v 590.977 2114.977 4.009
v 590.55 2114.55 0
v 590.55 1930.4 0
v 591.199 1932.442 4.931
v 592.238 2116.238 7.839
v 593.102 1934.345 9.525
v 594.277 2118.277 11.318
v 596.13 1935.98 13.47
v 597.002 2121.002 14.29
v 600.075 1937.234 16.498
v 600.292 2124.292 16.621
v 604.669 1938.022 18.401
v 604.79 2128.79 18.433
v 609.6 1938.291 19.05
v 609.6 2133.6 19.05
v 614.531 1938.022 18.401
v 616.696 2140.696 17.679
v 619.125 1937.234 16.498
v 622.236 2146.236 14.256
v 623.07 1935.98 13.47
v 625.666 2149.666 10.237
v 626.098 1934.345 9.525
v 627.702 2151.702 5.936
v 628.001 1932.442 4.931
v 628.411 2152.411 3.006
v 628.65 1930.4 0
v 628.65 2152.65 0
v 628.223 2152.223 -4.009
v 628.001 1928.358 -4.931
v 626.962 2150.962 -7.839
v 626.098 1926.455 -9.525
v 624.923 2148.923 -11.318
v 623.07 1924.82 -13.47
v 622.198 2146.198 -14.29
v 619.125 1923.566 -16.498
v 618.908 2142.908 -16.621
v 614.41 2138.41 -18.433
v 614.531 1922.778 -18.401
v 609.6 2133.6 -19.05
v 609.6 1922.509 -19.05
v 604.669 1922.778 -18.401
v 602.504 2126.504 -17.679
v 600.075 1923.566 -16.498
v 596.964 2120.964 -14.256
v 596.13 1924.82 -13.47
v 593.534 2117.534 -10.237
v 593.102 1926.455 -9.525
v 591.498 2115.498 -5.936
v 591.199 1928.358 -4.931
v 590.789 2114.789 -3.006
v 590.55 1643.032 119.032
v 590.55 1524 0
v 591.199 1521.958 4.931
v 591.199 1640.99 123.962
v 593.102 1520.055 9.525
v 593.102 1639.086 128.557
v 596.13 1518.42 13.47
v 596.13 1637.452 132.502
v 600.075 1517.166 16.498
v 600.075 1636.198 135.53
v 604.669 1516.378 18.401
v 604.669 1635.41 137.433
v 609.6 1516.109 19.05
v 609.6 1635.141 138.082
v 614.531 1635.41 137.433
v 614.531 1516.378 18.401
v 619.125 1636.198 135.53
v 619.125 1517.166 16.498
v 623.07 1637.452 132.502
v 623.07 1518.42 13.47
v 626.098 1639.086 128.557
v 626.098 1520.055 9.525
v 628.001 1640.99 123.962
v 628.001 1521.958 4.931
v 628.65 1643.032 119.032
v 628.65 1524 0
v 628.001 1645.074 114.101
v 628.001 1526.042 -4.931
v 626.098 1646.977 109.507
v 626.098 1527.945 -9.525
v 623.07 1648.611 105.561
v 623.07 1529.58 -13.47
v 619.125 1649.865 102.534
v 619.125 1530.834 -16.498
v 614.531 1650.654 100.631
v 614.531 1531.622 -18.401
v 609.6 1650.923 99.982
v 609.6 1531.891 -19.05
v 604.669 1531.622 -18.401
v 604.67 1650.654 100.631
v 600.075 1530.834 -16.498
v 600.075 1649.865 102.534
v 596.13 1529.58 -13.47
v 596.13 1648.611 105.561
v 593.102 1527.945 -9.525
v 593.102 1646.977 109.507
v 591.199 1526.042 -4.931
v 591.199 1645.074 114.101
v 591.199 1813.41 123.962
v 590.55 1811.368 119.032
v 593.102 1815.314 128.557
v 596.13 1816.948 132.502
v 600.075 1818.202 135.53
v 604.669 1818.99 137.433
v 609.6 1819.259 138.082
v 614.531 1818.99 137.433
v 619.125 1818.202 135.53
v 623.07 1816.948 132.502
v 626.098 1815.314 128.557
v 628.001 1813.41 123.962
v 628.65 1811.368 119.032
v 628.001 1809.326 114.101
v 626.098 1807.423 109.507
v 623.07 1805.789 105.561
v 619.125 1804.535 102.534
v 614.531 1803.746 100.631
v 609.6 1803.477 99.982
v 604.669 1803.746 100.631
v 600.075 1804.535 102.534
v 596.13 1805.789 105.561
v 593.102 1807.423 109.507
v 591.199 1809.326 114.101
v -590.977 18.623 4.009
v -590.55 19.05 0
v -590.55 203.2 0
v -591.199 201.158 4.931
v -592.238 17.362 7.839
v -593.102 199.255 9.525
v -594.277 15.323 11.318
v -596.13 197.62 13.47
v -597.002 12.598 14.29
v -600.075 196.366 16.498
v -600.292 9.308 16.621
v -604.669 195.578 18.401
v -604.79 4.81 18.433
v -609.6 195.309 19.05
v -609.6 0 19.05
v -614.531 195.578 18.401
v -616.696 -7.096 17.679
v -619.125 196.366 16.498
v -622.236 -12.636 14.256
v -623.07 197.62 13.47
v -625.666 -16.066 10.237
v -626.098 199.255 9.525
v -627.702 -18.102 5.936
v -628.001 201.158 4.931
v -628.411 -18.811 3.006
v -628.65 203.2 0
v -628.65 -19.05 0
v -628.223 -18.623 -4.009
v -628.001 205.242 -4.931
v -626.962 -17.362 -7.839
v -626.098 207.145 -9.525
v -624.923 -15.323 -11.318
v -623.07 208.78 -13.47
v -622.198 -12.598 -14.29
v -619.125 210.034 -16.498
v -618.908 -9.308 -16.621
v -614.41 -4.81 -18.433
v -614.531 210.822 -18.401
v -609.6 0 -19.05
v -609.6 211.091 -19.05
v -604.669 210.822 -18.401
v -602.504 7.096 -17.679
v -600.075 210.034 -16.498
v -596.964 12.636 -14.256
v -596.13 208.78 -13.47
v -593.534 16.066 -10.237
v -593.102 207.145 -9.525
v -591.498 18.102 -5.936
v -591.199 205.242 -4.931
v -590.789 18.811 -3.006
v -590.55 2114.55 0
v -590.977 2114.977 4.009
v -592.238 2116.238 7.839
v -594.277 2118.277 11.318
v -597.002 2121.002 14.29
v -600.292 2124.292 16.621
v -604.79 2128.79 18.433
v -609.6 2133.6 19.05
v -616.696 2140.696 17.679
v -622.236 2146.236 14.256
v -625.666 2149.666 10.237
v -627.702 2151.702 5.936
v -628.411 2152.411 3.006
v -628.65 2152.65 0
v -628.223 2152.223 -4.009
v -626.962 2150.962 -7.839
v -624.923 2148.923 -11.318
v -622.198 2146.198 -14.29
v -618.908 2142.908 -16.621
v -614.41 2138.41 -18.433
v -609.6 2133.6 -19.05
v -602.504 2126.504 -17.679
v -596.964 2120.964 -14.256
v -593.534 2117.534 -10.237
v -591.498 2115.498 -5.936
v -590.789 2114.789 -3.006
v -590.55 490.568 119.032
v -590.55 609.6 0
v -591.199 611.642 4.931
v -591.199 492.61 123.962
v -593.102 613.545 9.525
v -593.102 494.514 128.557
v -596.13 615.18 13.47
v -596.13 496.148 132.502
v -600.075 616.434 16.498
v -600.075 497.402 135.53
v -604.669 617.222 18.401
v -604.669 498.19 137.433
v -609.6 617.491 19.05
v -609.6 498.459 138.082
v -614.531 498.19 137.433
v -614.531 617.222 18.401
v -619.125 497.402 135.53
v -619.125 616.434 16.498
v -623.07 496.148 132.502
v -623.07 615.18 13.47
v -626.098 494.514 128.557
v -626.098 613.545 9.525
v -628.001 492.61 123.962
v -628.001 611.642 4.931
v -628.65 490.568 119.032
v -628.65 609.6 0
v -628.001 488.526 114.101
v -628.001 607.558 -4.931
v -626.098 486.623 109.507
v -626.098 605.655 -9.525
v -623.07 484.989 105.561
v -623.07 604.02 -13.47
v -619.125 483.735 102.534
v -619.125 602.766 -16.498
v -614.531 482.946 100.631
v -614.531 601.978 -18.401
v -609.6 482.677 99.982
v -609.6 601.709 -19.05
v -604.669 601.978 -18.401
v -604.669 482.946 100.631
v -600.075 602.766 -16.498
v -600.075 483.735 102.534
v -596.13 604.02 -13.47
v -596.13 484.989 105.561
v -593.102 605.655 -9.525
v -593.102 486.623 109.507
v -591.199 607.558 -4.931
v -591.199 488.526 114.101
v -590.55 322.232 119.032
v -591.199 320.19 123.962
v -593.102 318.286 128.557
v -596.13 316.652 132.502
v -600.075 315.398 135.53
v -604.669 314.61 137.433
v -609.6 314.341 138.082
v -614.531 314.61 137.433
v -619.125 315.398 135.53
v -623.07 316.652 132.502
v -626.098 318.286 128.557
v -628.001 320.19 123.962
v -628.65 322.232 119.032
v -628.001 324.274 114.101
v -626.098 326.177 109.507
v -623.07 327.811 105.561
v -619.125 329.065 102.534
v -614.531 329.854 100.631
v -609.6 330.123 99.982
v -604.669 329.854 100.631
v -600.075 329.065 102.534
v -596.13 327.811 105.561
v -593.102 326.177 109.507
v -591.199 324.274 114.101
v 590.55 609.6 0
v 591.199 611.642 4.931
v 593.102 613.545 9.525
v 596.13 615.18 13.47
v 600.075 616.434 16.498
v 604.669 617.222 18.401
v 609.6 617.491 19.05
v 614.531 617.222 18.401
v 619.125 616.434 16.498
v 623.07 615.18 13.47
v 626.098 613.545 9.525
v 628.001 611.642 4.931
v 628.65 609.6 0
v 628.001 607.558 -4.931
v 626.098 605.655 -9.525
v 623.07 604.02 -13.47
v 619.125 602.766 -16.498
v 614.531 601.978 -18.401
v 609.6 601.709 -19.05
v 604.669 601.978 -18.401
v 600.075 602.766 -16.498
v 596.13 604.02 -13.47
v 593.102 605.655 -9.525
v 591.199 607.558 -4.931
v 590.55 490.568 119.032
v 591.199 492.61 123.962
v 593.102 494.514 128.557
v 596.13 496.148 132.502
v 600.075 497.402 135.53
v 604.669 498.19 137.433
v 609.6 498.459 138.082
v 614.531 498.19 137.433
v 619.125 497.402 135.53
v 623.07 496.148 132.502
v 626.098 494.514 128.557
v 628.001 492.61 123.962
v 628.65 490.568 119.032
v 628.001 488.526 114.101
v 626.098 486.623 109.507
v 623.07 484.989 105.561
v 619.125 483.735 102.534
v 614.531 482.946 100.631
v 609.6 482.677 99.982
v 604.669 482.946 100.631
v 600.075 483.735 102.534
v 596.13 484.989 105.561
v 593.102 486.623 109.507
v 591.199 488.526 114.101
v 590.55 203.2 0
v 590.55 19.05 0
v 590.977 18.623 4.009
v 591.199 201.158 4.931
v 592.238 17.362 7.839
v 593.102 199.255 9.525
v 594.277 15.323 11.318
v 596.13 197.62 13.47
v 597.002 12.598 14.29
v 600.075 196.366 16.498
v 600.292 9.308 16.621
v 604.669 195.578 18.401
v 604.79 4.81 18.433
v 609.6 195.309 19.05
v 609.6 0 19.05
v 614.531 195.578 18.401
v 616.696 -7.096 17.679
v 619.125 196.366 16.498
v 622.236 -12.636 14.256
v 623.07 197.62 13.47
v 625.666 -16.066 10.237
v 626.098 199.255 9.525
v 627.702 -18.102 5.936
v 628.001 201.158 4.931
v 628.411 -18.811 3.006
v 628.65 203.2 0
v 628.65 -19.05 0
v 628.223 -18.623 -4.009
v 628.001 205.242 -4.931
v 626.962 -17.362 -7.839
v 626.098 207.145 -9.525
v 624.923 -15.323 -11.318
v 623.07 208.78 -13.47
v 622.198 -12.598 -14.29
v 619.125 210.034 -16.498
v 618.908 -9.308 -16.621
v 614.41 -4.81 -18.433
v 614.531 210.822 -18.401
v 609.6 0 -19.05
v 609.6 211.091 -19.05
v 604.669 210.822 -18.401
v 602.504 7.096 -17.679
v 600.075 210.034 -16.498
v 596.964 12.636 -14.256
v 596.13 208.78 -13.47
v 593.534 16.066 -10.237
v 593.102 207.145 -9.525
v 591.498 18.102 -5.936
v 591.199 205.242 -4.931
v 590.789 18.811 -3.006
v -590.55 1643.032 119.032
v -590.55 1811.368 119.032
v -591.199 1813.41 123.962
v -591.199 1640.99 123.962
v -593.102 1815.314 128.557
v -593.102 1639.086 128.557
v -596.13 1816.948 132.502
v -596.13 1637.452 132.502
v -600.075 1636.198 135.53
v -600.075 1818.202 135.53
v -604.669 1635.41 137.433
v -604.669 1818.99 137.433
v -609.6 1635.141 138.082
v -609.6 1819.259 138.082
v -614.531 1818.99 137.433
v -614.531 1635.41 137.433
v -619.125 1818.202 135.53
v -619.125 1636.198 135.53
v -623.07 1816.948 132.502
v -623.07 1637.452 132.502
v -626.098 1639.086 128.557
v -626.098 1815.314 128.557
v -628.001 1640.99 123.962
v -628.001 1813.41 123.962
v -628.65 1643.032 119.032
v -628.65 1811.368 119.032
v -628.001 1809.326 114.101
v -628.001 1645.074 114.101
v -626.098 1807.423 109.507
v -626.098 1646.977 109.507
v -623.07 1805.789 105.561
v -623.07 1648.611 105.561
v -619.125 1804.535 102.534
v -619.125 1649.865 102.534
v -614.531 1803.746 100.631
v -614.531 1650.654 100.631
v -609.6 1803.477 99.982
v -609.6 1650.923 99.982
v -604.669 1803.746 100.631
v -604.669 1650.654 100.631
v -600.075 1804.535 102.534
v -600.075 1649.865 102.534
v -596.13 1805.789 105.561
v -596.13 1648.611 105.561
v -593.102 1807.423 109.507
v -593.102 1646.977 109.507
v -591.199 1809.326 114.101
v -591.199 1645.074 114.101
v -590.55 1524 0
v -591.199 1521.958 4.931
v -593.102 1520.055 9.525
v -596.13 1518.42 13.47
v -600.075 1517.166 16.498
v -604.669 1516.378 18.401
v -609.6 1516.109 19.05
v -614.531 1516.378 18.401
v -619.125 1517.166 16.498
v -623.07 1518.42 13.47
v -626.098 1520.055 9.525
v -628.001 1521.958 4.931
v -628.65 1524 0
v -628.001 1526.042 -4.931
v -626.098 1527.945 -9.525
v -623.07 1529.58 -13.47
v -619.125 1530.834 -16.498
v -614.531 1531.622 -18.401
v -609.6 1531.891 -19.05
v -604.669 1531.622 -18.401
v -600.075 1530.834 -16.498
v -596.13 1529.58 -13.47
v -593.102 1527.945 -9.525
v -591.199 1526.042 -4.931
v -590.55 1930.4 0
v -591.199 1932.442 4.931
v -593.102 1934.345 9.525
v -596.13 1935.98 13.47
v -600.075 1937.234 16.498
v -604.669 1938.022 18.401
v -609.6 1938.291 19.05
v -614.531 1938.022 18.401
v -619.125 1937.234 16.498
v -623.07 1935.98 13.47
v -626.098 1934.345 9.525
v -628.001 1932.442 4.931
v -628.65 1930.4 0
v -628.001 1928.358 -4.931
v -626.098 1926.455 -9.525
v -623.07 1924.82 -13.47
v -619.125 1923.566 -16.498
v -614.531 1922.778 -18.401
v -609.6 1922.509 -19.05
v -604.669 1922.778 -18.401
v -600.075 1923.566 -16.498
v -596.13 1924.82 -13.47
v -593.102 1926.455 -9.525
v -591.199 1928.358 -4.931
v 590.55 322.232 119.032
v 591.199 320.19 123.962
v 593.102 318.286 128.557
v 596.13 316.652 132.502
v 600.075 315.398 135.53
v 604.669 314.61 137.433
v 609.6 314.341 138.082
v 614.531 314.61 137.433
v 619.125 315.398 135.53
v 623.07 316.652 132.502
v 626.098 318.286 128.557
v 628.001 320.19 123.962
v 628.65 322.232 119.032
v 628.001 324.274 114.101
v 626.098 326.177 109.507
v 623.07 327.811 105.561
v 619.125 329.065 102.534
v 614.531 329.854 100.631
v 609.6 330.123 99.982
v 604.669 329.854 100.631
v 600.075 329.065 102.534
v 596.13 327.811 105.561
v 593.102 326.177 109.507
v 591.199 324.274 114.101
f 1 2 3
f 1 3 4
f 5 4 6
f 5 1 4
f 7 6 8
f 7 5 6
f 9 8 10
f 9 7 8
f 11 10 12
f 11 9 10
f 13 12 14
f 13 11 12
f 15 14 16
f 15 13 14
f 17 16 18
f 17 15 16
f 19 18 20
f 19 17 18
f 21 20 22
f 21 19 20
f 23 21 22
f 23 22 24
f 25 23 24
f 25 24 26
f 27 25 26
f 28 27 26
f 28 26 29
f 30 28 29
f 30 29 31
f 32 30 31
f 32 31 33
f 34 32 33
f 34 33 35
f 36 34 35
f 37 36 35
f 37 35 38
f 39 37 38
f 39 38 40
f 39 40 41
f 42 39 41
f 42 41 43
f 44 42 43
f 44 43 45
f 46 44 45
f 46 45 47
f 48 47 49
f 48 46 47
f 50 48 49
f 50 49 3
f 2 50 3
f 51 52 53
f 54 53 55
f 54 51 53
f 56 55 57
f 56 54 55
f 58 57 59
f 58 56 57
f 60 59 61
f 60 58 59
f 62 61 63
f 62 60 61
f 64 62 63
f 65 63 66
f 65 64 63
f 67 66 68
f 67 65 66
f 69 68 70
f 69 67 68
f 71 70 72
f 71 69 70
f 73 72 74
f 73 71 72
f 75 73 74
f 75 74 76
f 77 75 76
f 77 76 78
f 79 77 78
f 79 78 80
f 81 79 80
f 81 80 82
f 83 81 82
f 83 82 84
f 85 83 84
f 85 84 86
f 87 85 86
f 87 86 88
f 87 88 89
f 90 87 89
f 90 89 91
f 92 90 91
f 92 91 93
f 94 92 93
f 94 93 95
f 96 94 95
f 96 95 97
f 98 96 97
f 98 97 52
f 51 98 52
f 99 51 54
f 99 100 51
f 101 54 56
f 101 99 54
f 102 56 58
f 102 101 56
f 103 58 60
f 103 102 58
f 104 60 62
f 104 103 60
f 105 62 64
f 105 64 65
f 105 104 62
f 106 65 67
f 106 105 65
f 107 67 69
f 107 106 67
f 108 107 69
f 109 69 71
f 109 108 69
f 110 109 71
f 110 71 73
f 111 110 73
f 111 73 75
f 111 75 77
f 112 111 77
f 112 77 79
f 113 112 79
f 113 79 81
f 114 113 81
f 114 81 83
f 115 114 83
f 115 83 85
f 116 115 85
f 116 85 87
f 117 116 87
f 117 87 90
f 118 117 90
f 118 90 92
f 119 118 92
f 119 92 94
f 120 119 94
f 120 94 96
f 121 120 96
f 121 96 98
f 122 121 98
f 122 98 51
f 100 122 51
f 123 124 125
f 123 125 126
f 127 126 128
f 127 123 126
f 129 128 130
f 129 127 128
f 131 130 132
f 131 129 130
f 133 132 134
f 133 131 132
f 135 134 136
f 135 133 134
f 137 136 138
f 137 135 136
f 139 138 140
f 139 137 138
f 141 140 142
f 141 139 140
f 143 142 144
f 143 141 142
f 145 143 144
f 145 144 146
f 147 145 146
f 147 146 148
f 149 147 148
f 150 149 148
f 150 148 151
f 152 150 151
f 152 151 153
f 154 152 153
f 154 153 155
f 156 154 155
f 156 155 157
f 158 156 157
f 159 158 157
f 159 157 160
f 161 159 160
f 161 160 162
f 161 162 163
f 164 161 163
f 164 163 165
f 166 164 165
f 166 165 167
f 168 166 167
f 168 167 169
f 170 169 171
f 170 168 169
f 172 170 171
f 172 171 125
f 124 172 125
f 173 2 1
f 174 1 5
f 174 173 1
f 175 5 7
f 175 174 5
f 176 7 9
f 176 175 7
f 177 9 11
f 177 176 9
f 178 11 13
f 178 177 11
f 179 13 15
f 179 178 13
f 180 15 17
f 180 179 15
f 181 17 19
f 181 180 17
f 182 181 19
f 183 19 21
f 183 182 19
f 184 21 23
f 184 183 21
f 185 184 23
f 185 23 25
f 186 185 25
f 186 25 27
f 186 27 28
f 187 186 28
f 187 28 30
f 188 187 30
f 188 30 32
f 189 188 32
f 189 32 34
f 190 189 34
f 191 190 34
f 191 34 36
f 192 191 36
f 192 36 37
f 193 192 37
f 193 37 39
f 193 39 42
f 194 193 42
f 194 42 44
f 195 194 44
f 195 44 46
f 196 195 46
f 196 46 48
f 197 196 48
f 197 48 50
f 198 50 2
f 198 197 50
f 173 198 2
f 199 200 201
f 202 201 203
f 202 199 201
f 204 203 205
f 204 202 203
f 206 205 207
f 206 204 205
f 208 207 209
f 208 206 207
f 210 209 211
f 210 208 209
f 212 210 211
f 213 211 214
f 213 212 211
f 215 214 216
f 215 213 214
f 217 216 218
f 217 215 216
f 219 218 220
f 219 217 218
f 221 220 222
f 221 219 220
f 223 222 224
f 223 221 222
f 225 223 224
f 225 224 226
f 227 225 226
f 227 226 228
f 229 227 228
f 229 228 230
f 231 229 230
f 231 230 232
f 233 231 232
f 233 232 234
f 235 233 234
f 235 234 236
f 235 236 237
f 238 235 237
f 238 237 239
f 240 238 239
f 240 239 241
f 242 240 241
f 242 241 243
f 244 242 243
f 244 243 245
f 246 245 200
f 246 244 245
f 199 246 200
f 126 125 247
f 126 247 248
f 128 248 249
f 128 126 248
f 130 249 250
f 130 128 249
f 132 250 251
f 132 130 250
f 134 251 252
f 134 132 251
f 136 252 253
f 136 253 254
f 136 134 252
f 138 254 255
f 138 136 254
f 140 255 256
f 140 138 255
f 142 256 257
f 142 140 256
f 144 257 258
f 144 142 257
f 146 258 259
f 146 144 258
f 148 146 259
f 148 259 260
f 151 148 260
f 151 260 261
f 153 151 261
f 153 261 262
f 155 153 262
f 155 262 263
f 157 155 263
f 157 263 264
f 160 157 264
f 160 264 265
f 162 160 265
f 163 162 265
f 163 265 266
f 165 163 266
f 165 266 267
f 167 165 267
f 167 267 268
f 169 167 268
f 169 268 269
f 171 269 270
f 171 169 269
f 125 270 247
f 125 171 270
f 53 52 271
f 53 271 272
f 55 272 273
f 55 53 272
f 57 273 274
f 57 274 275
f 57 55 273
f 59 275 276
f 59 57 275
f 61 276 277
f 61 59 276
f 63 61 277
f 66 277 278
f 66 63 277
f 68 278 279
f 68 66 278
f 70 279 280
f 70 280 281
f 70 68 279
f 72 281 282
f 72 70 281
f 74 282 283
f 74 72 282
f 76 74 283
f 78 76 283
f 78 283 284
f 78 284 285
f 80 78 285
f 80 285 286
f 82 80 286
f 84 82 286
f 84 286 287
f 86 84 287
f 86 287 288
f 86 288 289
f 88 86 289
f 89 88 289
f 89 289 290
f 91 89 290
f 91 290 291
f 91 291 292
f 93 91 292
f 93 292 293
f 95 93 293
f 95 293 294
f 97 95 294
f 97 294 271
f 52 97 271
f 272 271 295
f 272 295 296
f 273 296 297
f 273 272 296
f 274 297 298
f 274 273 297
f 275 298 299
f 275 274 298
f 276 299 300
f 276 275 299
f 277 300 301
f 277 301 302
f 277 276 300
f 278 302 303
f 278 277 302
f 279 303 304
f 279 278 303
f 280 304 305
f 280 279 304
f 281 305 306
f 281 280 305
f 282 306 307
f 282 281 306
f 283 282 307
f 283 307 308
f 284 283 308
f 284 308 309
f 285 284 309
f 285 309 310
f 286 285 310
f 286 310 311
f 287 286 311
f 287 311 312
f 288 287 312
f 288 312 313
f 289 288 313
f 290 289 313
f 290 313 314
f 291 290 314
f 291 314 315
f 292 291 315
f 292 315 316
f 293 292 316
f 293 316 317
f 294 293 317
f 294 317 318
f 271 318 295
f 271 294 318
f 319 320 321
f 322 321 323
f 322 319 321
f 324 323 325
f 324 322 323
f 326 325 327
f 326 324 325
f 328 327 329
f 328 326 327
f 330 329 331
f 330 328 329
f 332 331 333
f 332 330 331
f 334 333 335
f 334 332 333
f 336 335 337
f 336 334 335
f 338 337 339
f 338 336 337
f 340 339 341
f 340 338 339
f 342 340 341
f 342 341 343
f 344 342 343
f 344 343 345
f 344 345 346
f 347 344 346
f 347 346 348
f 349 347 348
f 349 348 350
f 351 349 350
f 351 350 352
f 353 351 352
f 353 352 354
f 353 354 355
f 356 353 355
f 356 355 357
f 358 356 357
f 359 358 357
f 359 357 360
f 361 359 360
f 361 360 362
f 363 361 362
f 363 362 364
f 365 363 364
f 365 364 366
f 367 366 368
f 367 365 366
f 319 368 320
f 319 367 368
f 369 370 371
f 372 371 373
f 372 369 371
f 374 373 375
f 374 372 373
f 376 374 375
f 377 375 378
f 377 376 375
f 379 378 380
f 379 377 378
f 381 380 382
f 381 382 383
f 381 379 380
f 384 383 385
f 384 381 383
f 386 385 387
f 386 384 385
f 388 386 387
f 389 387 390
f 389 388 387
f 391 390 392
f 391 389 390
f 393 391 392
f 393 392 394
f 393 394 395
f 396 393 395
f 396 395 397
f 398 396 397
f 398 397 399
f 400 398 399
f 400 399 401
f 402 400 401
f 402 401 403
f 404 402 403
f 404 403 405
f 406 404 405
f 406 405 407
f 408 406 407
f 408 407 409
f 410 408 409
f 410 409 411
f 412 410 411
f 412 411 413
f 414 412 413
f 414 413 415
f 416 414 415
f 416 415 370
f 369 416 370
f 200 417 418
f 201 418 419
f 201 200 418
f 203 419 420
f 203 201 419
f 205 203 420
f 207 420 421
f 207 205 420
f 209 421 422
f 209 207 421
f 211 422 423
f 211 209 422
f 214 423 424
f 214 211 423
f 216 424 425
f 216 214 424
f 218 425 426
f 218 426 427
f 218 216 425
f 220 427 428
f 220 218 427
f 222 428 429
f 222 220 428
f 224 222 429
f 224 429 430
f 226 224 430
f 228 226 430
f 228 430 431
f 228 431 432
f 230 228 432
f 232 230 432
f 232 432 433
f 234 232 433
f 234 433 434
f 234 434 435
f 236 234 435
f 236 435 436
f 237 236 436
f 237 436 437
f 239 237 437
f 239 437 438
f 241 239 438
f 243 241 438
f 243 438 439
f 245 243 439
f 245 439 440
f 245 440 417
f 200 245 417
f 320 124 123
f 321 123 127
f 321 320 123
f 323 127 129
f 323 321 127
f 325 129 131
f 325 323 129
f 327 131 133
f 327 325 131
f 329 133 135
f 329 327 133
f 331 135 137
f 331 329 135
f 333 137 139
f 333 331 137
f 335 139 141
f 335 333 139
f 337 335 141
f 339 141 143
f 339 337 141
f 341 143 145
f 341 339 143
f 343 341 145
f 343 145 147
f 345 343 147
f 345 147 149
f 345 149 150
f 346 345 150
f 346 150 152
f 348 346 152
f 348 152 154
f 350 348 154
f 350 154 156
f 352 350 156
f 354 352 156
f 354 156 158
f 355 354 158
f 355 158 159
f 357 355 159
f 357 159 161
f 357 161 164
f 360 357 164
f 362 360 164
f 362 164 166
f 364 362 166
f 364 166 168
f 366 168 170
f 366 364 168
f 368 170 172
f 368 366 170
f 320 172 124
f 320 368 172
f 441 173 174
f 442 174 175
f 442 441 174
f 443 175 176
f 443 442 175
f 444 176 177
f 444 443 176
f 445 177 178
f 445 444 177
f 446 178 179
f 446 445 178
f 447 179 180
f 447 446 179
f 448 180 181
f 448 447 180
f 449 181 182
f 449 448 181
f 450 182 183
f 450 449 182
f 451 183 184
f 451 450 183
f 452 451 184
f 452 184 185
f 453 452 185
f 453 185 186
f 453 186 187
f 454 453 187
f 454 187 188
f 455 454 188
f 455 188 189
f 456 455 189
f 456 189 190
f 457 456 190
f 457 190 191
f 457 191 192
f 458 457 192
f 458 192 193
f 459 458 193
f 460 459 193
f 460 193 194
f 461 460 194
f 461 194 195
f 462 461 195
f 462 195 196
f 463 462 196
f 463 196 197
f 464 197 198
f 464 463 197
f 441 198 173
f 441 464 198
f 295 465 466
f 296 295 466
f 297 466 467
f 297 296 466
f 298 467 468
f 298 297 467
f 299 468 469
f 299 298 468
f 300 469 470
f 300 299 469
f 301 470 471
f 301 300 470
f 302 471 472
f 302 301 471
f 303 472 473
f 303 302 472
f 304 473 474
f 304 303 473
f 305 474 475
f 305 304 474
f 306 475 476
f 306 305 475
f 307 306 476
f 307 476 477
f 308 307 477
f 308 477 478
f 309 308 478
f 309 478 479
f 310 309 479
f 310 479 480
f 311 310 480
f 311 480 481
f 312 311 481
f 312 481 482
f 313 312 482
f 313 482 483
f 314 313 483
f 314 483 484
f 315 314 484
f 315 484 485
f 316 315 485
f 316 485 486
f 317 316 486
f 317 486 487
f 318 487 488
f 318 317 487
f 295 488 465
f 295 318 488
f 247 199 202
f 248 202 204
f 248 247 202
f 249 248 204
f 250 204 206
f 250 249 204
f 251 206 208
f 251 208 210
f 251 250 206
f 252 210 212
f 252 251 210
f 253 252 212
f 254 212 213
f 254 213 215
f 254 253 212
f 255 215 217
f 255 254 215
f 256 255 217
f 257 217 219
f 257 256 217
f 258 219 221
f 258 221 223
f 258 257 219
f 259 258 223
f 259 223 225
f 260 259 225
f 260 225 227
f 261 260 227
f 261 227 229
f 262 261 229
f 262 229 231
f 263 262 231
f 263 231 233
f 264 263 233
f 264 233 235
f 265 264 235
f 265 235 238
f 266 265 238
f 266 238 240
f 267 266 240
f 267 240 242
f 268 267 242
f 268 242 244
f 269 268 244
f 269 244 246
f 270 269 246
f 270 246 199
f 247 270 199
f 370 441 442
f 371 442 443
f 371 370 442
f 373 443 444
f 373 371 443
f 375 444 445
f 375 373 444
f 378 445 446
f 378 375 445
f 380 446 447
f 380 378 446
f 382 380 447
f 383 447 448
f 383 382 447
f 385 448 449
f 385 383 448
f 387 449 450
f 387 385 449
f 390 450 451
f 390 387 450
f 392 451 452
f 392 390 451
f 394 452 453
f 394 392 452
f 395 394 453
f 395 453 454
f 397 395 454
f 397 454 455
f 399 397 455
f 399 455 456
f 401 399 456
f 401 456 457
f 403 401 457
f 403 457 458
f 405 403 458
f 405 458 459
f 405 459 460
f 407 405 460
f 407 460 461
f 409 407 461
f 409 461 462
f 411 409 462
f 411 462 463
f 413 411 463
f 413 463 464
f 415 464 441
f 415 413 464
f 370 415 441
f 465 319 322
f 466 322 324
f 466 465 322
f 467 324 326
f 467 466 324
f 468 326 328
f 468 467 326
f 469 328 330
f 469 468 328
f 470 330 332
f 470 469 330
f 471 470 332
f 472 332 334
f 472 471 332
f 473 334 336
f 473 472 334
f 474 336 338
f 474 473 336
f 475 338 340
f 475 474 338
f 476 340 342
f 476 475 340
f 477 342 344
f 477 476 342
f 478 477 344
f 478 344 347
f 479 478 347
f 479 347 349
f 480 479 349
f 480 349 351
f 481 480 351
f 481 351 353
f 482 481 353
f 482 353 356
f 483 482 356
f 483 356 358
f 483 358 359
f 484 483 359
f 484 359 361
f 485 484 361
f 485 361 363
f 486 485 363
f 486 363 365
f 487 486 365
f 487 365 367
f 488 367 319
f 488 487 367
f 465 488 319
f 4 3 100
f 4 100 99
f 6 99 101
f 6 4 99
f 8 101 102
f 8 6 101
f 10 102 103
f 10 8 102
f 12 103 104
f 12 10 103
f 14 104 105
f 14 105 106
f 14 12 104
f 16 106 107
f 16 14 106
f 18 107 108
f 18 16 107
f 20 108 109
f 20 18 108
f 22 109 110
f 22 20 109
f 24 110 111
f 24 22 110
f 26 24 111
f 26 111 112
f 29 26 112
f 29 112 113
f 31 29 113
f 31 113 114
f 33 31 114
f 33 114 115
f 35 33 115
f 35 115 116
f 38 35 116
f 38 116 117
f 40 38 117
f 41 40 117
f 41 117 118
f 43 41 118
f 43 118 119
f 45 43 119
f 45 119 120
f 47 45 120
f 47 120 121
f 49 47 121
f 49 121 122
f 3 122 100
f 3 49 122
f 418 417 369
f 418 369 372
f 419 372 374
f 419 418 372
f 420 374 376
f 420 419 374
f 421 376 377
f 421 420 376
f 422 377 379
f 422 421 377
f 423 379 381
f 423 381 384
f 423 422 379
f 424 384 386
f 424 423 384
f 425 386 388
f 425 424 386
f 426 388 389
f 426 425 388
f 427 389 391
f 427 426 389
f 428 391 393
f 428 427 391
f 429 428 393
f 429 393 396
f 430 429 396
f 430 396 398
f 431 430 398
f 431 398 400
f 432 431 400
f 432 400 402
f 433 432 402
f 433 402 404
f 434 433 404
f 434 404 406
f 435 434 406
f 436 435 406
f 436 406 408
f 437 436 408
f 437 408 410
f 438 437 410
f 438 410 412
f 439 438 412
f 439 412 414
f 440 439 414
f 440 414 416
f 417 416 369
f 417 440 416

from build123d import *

# Parameters (mm, degrees)
F2_R = 19.05


with BuildPart() as f7:
    # F7: sweep along a path in F0, F4, F0, F4, F0, F6, F0, F6, F0
    with BuildLine(Plane.XY) as f7_path:
        Line((-609.6, 203.2), (-609.6, 0))
    with BuildLine(Plane.YZ.offset(-609.6)) as f7_path_2:
        Line((203.2, 0), (322.2318041258, 119.0318041258))
        Line((322.2318041258, 119.0318041258), (490.5681958742, 119.0318041258))
        Line((490.5681958742, 119.0318041258), (609.6, 0))
    with BuildLine(Plane.XY) as f7_path_3:
        Line((-609.6, 1524), (-609.6, 609.6))
    with BuildLine(Plane.YZ.offset(-609.6)) as f7_path_4:
        Line((1524, 0), (1643.0318041258, 119.0318041258))
        Line((1643.0318041258, 119.0318041258), (1811.3681958742, 119.0318041258))
        Line((1811.3681958742, 119.0318041258), (1930.4, 0))
        Line((1930.4, 0), (2133.6, 0))
    with BuildLine(Plane.XY) as f7_path_5:
        Line((-609.6, 2133.6), (609.6, 2133.6))
        Line((609.6, 2133.6), (609.6, 1930.4))
    with BuildLine(Plane.YZ.offset(609.6)) as f7_path_6:
        Line((1930.4, 0), (1811.3681958742, 119.0318041258))
        Line((1811.3681958742, 119.0318041258), (1643.0318041258, 119.0318041258))
        Line((1643.0318041258, 119.0318041258), (1524, 0))
    with BuildLine(Plane.XY) as f7_path_7:
        Line((609.6, 609.6), (609.6, 1524))
    with BuildLine(Plane.YZ.offset(609.6)) as f7_path_8:
        Line((609.6, 0), (490.5681958742, 119.0318041258))
        Line((490.5681958742, 119.0318041258), (322.2318041258, 119.0318041258))
        Line((322.2318041258, 119.0318041258), (203.2, 0))
    with BuildLine(Plane.XY) as f7_path_9:
        Line((609.6, 203.2), (609.6, 0))
        Line((609.6, 0), (-609.6, 0))
    # F2 (on plane+point) → F7 (sweep)
    with BuildSketch(Plane.XZ):
        with Locations((-609.6, 0)):
            Circle(F2_R)
    sweep(path=f7_path.line + f7_path_2.line + f7_path_3.line + f7_path_4.line + f7_path_5.line + f7_path_6.line + f7_path_7.line + f7_path_8.line + f7_path_9.line, transition=Transition.RIGHT)


solid = f7.part
